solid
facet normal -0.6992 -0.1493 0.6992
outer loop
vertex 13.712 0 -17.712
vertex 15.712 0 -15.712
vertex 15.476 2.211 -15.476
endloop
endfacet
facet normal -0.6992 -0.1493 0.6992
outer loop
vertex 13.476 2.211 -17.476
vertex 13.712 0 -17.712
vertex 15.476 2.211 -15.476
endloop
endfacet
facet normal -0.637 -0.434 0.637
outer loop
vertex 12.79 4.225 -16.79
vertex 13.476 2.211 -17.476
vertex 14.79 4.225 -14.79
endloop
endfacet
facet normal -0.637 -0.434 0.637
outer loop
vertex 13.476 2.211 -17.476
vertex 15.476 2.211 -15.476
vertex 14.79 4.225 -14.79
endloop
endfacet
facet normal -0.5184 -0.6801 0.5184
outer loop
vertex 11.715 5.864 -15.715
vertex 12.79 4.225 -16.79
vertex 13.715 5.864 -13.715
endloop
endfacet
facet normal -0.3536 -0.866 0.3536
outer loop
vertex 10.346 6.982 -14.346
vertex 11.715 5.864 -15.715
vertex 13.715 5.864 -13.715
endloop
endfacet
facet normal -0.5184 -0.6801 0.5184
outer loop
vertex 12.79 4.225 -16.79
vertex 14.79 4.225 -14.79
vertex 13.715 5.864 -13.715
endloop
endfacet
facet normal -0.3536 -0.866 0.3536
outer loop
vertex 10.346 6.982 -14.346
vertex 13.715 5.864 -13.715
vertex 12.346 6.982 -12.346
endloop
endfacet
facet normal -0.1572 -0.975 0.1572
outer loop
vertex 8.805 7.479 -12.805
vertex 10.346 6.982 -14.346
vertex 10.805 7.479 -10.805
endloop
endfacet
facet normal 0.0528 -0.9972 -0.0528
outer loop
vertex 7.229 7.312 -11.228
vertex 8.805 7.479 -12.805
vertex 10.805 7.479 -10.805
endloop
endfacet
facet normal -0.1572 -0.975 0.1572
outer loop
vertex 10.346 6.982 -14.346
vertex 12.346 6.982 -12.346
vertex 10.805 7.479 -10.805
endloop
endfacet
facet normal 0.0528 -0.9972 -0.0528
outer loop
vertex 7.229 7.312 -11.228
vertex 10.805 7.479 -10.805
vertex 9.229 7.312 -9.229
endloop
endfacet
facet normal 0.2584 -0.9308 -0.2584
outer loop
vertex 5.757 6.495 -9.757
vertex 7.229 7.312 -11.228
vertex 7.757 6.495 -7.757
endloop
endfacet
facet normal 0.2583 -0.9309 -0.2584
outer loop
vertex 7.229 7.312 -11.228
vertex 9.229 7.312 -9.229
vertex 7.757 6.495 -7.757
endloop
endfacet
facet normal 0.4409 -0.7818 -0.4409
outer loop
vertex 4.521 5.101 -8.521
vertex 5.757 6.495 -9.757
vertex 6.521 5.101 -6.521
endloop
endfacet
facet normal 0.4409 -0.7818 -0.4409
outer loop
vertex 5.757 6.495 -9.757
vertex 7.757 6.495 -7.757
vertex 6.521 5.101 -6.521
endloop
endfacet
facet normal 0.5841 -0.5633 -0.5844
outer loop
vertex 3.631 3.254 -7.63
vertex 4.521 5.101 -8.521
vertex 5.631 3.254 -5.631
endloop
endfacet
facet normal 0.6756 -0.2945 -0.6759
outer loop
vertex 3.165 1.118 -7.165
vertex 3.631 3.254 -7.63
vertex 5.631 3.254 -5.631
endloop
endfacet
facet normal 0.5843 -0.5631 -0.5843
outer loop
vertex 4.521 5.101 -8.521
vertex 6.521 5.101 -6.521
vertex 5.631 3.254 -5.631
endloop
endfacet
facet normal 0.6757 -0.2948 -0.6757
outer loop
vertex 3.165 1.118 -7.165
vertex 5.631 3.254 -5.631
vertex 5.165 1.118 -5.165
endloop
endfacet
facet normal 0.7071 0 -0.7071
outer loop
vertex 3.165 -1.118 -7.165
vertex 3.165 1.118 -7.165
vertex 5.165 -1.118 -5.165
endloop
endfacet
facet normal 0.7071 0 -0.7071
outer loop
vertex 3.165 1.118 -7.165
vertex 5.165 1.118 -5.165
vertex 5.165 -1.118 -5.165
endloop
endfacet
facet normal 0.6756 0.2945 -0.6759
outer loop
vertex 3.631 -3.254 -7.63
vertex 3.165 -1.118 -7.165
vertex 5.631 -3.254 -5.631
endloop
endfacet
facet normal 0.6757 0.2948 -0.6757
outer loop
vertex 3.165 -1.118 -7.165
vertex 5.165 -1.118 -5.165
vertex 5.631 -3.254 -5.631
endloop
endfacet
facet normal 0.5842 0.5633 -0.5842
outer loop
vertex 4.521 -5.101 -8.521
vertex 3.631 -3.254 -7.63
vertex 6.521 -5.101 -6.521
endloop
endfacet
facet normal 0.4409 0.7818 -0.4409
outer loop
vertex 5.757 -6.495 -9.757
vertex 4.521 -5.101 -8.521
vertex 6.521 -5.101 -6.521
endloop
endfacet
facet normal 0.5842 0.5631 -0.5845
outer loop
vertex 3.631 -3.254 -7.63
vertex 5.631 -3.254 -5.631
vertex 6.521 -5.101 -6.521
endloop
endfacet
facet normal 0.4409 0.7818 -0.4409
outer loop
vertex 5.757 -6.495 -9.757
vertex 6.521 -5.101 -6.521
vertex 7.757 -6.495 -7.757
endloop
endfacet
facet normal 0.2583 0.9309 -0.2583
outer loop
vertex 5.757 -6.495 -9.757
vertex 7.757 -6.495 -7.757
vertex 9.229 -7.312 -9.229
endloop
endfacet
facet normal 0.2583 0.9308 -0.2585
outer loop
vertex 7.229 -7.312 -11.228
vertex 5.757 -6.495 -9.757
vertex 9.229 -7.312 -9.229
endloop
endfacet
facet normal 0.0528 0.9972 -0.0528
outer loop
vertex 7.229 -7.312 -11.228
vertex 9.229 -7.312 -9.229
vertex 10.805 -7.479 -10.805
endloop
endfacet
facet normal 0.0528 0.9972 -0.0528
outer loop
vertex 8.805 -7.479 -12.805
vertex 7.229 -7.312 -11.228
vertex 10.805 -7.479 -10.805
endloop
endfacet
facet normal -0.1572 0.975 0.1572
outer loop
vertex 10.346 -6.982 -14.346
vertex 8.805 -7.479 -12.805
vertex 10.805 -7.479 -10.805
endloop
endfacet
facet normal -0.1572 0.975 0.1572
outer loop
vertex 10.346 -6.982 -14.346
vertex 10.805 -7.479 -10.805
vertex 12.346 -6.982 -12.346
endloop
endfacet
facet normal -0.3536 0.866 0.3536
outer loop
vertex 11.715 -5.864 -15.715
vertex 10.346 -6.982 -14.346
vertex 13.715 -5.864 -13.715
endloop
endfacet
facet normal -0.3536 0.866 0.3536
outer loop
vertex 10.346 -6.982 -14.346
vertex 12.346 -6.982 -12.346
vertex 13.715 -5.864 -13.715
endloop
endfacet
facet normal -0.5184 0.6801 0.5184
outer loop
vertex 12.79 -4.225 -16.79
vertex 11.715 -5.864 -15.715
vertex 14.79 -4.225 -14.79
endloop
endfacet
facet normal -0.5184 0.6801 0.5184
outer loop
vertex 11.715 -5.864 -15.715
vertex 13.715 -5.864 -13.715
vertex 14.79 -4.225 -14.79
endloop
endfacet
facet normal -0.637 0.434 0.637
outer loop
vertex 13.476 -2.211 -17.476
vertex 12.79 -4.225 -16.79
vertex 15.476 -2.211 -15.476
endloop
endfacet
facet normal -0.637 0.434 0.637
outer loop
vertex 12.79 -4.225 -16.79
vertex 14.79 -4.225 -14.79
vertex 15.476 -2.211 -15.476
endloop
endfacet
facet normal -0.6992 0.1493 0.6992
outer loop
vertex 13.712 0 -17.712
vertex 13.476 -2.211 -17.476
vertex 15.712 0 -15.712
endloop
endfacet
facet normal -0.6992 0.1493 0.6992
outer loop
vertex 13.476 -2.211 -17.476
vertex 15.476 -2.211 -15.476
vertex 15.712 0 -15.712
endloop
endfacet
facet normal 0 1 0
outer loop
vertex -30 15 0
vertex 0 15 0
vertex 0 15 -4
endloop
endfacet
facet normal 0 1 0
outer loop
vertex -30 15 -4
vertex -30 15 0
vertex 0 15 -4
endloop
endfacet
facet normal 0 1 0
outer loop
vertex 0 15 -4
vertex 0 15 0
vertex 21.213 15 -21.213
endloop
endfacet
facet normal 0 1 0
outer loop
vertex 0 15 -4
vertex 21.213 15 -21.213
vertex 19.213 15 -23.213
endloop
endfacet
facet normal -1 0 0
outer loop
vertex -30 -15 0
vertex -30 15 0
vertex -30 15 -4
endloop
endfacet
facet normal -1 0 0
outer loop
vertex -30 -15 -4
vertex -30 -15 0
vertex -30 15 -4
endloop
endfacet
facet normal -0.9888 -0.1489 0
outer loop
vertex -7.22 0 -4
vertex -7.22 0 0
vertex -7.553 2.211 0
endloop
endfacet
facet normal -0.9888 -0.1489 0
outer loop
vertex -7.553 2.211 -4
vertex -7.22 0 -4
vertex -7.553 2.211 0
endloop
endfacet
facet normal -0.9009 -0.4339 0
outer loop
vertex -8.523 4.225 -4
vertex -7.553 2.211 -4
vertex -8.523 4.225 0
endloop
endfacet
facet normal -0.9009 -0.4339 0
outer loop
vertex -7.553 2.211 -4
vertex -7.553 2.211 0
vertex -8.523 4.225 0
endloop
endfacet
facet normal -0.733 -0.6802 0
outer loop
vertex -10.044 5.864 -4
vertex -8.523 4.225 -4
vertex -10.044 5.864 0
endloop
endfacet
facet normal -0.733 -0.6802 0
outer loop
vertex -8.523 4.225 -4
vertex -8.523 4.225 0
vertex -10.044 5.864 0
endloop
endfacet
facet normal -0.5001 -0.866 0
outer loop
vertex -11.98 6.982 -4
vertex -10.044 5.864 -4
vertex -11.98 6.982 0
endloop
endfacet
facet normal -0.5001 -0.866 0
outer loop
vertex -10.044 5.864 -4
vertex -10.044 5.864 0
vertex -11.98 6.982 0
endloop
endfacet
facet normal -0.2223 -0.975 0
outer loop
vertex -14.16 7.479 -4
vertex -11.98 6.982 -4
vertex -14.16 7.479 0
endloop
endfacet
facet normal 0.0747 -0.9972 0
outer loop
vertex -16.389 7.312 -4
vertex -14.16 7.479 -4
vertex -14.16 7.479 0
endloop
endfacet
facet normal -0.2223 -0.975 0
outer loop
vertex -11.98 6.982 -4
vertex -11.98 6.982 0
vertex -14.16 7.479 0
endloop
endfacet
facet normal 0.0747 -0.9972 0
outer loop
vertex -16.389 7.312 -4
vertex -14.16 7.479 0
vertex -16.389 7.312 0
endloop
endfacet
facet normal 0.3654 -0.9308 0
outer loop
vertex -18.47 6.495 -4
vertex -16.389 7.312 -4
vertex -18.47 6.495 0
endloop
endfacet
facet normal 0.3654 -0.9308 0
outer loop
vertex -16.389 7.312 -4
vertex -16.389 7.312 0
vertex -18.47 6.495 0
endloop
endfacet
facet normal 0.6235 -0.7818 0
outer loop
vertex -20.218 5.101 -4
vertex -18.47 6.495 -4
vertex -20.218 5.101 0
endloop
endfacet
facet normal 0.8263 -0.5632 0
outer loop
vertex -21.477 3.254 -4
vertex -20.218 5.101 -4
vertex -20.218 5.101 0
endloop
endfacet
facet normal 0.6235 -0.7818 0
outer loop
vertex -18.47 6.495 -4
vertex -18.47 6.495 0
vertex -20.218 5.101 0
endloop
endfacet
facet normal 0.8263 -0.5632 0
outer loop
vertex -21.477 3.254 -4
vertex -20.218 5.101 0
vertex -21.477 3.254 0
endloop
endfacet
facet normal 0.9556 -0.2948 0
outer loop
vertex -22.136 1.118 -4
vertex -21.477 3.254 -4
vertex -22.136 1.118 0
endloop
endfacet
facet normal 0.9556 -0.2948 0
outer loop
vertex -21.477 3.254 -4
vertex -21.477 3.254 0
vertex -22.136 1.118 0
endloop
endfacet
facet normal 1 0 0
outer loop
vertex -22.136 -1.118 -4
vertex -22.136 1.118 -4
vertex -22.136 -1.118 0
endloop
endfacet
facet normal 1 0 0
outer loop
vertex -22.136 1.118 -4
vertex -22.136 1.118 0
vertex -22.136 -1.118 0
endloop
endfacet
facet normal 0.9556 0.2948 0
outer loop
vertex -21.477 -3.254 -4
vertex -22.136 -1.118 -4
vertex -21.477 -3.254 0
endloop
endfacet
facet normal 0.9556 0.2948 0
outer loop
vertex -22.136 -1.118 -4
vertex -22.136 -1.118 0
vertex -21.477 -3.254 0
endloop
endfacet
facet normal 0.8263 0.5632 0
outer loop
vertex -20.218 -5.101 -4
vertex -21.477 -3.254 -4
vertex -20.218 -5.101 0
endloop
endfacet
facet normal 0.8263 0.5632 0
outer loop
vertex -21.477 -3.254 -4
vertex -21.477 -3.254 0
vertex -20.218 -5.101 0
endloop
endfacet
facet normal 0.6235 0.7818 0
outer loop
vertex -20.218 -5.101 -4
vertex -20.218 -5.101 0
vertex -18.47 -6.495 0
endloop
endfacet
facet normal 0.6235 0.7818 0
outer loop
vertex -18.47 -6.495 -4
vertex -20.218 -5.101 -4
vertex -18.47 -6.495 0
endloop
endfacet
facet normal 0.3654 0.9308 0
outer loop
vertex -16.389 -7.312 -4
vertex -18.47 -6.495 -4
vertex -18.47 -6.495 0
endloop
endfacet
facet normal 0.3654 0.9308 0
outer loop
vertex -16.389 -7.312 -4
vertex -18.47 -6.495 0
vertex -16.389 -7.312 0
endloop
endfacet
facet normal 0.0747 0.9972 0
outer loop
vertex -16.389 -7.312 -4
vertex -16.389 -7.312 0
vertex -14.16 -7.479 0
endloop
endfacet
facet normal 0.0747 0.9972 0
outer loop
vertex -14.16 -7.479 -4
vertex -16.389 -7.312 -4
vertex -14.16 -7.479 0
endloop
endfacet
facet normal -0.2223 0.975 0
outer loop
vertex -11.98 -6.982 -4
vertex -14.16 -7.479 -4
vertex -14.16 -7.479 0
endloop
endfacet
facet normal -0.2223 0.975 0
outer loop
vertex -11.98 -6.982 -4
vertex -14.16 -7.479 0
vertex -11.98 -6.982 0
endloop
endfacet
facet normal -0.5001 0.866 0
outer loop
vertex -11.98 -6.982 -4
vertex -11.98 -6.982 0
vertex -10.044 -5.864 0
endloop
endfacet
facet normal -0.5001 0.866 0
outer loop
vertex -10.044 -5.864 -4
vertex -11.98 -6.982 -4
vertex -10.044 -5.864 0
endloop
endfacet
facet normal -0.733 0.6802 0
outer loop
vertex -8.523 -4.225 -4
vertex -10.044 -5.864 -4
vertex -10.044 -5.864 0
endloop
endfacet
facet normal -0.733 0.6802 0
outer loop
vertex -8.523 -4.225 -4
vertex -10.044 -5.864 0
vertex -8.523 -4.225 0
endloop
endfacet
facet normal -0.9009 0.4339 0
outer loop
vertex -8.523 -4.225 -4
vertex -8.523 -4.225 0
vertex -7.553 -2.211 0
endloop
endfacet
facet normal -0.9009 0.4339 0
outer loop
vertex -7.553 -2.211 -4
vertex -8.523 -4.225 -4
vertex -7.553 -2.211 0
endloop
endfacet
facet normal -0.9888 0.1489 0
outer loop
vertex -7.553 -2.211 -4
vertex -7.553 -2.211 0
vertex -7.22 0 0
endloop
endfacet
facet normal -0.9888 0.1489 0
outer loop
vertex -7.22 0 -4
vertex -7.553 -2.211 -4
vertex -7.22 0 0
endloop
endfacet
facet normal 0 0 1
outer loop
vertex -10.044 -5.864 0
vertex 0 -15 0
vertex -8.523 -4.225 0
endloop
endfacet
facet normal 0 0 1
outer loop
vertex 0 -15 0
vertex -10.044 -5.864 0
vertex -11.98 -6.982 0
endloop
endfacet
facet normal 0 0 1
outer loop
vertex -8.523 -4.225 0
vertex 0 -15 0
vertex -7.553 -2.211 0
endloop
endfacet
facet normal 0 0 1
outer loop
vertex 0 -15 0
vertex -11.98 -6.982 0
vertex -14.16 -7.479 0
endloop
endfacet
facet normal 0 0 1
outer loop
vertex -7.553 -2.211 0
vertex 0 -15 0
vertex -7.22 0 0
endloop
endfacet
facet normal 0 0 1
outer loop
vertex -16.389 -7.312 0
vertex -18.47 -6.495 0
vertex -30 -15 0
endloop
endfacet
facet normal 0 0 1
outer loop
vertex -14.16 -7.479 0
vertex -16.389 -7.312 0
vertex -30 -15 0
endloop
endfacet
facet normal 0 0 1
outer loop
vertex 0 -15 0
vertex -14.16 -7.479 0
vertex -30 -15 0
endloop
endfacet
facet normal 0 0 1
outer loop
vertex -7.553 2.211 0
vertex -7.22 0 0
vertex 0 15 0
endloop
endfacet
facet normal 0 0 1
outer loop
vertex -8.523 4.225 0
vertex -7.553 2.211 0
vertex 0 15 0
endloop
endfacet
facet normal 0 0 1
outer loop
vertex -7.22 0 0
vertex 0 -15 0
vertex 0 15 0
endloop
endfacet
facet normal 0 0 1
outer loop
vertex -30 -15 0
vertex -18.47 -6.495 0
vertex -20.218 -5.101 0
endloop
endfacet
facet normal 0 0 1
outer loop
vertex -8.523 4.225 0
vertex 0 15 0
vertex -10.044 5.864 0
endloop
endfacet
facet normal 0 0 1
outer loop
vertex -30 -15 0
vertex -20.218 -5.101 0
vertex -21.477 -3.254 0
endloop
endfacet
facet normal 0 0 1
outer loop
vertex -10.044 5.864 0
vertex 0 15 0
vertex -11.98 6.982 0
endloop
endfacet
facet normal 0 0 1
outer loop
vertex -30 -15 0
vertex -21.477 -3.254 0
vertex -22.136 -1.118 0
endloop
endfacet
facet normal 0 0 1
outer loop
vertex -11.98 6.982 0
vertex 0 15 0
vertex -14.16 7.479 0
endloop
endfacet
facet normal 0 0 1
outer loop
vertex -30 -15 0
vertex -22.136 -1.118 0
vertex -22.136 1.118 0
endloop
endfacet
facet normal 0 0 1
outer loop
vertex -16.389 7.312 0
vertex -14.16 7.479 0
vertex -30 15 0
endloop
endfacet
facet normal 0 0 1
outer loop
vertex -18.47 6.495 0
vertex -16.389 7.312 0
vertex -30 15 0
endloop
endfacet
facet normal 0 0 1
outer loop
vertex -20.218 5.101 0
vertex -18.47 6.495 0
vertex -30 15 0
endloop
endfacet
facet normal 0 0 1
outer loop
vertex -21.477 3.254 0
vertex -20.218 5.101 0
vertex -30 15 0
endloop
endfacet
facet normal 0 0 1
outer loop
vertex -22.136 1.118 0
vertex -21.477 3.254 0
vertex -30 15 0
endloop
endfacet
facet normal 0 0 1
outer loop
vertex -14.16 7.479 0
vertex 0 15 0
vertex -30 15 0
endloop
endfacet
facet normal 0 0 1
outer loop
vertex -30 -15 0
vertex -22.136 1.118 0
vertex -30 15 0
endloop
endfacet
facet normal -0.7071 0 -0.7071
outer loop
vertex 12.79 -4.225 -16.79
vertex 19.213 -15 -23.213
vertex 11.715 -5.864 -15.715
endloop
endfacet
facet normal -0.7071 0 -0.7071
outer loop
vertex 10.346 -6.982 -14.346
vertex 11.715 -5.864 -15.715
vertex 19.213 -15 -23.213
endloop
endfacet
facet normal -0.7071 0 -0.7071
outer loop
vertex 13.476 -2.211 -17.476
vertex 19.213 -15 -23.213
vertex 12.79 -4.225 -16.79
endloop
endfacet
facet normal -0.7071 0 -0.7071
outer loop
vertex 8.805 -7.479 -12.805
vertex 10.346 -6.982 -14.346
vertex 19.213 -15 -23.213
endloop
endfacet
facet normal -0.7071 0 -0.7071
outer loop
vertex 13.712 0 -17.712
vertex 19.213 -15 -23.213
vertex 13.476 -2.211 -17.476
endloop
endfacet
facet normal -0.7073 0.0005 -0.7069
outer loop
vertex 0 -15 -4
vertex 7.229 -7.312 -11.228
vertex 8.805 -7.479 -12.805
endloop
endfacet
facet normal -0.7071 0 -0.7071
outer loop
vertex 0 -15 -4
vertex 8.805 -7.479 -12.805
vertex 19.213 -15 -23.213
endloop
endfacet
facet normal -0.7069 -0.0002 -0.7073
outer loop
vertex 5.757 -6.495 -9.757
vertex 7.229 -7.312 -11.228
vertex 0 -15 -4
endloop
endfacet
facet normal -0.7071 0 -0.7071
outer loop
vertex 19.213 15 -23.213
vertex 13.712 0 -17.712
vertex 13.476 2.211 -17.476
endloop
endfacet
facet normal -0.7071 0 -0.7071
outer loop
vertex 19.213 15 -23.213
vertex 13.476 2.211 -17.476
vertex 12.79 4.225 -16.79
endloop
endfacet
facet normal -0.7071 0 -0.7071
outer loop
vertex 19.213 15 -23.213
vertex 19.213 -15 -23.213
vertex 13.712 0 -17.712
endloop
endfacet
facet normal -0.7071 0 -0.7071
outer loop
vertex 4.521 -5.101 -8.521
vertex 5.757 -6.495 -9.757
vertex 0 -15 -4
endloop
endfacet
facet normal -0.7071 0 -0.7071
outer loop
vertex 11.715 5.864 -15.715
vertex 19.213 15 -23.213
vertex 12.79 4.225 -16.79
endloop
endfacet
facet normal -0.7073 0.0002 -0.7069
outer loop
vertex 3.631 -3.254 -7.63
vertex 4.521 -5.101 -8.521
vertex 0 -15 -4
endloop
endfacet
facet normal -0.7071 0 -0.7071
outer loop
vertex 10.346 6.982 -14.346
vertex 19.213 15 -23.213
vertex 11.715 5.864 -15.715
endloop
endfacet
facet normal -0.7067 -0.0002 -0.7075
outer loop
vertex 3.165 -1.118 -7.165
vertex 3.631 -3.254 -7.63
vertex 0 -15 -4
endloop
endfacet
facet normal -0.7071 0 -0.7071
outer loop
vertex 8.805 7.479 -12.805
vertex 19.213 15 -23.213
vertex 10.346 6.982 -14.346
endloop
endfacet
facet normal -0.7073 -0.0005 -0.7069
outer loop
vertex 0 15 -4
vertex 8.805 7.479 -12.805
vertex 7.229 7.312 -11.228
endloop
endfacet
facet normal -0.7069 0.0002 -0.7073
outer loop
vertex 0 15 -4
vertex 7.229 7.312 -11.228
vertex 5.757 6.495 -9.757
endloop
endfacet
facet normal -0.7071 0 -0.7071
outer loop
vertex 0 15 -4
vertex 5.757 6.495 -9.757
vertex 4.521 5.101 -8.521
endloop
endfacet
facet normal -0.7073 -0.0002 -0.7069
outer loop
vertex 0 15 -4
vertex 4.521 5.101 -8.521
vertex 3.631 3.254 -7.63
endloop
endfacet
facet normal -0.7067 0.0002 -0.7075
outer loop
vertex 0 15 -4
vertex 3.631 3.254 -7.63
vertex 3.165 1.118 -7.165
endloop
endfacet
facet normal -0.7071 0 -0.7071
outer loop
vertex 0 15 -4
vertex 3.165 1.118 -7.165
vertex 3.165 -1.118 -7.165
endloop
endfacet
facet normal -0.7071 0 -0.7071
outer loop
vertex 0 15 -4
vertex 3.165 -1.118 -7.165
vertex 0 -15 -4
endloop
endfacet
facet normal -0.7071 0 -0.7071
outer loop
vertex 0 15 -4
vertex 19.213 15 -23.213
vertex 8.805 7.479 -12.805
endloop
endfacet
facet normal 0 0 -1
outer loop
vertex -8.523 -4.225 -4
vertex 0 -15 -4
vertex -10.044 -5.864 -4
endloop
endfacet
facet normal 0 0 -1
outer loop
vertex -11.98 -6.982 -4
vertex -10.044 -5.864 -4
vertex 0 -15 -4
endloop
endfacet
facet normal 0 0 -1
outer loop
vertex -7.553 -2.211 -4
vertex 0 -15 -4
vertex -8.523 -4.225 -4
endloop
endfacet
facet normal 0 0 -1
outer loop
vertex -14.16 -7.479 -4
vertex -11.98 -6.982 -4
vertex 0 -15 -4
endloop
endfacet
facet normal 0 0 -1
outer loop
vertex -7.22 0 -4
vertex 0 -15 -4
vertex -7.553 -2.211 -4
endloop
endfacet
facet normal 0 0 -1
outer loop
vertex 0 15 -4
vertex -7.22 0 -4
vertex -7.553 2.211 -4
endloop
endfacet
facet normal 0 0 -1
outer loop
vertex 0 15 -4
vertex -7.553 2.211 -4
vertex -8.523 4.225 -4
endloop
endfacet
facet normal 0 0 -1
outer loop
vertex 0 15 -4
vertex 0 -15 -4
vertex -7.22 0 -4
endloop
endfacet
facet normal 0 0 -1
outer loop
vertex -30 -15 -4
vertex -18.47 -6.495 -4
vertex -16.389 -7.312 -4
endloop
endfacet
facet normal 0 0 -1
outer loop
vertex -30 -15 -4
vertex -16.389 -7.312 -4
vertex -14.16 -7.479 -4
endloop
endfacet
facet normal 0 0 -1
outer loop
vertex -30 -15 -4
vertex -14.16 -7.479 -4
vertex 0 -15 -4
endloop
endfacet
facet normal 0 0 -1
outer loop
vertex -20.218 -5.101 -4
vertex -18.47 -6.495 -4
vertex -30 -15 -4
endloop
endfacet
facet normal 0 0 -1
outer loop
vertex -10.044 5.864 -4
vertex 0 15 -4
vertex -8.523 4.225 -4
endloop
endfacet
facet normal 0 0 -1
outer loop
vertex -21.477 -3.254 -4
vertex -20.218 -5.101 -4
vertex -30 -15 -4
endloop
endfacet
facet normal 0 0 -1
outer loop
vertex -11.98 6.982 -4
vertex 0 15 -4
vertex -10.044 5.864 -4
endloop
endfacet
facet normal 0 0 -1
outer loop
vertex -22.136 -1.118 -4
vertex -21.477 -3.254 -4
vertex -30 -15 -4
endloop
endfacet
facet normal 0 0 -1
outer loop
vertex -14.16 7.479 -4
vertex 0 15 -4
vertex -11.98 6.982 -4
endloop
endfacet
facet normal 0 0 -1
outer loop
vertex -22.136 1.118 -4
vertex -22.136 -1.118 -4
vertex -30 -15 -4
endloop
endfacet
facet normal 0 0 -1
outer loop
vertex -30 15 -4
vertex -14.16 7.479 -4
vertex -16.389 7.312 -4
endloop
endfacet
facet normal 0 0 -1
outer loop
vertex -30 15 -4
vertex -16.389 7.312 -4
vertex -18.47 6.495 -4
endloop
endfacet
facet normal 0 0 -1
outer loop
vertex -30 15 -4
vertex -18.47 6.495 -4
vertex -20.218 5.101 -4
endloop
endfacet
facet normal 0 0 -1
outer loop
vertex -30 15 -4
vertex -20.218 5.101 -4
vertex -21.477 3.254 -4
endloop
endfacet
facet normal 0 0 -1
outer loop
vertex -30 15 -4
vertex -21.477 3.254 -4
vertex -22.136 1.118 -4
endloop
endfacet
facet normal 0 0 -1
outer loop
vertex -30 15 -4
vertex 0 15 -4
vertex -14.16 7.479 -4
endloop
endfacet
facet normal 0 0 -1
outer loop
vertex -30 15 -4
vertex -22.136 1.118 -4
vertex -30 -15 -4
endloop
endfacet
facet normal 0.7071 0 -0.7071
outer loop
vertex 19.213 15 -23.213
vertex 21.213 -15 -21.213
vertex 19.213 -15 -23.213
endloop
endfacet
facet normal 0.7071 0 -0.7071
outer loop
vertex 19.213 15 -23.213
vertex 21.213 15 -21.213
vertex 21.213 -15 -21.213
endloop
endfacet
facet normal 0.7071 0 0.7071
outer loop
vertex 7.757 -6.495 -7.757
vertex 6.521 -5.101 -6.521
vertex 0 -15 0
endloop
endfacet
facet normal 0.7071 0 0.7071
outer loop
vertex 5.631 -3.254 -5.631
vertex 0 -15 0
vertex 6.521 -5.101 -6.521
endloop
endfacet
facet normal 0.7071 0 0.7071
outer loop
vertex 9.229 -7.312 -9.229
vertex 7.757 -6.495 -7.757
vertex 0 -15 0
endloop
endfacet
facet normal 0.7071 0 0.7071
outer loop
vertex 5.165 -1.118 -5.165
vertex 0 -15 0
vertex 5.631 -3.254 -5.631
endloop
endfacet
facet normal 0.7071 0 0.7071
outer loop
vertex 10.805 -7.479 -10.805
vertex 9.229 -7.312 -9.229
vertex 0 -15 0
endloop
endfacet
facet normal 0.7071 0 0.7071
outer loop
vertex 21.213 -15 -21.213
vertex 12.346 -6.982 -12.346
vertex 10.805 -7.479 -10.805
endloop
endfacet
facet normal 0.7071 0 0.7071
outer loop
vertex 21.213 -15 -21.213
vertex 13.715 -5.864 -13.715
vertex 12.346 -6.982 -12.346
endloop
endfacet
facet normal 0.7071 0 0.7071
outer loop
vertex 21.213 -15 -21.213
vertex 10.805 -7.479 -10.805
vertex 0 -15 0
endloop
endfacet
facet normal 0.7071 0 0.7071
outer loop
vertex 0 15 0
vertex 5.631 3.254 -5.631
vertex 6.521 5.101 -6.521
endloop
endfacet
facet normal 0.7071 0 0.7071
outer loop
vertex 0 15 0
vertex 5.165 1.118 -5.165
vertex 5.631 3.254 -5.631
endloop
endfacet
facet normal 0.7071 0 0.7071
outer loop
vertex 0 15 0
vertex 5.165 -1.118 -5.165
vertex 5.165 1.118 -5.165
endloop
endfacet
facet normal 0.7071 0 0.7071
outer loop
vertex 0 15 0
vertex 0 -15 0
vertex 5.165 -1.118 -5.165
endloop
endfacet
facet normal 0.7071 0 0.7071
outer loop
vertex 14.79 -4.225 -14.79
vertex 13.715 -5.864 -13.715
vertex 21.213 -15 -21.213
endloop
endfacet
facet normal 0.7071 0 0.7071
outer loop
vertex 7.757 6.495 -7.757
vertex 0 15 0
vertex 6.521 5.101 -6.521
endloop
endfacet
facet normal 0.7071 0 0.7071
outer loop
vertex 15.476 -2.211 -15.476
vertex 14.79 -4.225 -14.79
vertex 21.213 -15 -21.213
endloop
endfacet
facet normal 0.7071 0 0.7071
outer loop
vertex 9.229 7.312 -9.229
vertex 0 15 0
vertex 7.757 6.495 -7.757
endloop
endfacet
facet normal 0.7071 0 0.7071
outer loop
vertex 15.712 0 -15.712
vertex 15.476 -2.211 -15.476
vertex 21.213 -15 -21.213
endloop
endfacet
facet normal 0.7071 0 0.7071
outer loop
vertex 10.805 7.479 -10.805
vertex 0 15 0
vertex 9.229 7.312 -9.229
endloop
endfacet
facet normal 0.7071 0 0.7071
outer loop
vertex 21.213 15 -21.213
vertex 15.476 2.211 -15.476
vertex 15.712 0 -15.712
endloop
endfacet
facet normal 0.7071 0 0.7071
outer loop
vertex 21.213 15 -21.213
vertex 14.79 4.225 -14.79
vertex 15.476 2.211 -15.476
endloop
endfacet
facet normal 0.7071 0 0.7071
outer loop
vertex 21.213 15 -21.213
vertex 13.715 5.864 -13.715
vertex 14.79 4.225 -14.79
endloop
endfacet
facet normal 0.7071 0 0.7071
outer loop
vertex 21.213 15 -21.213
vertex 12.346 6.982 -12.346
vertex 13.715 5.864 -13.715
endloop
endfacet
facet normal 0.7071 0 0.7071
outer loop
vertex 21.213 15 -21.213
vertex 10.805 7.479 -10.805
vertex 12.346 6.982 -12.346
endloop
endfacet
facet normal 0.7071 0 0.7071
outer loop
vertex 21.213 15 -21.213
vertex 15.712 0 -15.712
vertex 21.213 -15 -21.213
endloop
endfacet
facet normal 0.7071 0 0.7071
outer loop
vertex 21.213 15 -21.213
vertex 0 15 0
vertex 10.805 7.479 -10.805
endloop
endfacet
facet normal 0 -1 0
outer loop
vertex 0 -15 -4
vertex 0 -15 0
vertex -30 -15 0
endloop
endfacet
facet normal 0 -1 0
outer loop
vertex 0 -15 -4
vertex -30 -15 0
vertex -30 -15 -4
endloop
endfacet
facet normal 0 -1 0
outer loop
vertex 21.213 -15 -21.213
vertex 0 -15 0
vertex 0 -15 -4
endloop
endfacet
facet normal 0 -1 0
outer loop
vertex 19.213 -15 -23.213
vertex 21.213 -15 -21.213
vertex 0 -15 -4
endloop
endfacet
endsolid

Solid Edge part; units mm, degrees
sketch "Sketch1" plane through (0, 0, 0) normal (0, -1, 0) x (1, 0, 0)
  line L0 (0, 0) -> (-30, 0)
  line L1 (-30, 0) -> (-30, -4)
  line L2 (0, -4) -> (-30, -4)
  line L3 (19.2132, -23.2132) -> (0, -4)
  line L4 (21.2132, -21.2132) -> (19.2132, -23.2132)
  line L5 (0, 0) -> (21.2132, -21.2132)
  dimension "D1" = 4
  dimension "D2" = 30
  dimension "D3" = 30
extrude "Protrusion1" add sketch "Sketch1" along normal mid plane 30
sketch "Sketch2" plane through (-15, 0, 0) normal (0, 0, 1) x (1, 0, 0)
  circle A0 centre (0.28, 0) radius 7.5
  dimension "D1" = 15
  dimension "D2" = 14.72
extrude "Cutout1" cut sketch "Sketch2" against normal up to surface (4 mm away)
sketch "Sketch3" plane through (10.6066, 0, -10.6066) normal (0.7071068, 0, 0.7071068) x (0.7071068, 0, -0.7071068)
  circle A0 centre (-0.28, 0) radius 7.5
  dimension "D1" = 15
  dimension "D2" = 14.72
extrude "Cutout2" cut sketch "Sketch3" against normal up to surface (2.8284 mm away)
